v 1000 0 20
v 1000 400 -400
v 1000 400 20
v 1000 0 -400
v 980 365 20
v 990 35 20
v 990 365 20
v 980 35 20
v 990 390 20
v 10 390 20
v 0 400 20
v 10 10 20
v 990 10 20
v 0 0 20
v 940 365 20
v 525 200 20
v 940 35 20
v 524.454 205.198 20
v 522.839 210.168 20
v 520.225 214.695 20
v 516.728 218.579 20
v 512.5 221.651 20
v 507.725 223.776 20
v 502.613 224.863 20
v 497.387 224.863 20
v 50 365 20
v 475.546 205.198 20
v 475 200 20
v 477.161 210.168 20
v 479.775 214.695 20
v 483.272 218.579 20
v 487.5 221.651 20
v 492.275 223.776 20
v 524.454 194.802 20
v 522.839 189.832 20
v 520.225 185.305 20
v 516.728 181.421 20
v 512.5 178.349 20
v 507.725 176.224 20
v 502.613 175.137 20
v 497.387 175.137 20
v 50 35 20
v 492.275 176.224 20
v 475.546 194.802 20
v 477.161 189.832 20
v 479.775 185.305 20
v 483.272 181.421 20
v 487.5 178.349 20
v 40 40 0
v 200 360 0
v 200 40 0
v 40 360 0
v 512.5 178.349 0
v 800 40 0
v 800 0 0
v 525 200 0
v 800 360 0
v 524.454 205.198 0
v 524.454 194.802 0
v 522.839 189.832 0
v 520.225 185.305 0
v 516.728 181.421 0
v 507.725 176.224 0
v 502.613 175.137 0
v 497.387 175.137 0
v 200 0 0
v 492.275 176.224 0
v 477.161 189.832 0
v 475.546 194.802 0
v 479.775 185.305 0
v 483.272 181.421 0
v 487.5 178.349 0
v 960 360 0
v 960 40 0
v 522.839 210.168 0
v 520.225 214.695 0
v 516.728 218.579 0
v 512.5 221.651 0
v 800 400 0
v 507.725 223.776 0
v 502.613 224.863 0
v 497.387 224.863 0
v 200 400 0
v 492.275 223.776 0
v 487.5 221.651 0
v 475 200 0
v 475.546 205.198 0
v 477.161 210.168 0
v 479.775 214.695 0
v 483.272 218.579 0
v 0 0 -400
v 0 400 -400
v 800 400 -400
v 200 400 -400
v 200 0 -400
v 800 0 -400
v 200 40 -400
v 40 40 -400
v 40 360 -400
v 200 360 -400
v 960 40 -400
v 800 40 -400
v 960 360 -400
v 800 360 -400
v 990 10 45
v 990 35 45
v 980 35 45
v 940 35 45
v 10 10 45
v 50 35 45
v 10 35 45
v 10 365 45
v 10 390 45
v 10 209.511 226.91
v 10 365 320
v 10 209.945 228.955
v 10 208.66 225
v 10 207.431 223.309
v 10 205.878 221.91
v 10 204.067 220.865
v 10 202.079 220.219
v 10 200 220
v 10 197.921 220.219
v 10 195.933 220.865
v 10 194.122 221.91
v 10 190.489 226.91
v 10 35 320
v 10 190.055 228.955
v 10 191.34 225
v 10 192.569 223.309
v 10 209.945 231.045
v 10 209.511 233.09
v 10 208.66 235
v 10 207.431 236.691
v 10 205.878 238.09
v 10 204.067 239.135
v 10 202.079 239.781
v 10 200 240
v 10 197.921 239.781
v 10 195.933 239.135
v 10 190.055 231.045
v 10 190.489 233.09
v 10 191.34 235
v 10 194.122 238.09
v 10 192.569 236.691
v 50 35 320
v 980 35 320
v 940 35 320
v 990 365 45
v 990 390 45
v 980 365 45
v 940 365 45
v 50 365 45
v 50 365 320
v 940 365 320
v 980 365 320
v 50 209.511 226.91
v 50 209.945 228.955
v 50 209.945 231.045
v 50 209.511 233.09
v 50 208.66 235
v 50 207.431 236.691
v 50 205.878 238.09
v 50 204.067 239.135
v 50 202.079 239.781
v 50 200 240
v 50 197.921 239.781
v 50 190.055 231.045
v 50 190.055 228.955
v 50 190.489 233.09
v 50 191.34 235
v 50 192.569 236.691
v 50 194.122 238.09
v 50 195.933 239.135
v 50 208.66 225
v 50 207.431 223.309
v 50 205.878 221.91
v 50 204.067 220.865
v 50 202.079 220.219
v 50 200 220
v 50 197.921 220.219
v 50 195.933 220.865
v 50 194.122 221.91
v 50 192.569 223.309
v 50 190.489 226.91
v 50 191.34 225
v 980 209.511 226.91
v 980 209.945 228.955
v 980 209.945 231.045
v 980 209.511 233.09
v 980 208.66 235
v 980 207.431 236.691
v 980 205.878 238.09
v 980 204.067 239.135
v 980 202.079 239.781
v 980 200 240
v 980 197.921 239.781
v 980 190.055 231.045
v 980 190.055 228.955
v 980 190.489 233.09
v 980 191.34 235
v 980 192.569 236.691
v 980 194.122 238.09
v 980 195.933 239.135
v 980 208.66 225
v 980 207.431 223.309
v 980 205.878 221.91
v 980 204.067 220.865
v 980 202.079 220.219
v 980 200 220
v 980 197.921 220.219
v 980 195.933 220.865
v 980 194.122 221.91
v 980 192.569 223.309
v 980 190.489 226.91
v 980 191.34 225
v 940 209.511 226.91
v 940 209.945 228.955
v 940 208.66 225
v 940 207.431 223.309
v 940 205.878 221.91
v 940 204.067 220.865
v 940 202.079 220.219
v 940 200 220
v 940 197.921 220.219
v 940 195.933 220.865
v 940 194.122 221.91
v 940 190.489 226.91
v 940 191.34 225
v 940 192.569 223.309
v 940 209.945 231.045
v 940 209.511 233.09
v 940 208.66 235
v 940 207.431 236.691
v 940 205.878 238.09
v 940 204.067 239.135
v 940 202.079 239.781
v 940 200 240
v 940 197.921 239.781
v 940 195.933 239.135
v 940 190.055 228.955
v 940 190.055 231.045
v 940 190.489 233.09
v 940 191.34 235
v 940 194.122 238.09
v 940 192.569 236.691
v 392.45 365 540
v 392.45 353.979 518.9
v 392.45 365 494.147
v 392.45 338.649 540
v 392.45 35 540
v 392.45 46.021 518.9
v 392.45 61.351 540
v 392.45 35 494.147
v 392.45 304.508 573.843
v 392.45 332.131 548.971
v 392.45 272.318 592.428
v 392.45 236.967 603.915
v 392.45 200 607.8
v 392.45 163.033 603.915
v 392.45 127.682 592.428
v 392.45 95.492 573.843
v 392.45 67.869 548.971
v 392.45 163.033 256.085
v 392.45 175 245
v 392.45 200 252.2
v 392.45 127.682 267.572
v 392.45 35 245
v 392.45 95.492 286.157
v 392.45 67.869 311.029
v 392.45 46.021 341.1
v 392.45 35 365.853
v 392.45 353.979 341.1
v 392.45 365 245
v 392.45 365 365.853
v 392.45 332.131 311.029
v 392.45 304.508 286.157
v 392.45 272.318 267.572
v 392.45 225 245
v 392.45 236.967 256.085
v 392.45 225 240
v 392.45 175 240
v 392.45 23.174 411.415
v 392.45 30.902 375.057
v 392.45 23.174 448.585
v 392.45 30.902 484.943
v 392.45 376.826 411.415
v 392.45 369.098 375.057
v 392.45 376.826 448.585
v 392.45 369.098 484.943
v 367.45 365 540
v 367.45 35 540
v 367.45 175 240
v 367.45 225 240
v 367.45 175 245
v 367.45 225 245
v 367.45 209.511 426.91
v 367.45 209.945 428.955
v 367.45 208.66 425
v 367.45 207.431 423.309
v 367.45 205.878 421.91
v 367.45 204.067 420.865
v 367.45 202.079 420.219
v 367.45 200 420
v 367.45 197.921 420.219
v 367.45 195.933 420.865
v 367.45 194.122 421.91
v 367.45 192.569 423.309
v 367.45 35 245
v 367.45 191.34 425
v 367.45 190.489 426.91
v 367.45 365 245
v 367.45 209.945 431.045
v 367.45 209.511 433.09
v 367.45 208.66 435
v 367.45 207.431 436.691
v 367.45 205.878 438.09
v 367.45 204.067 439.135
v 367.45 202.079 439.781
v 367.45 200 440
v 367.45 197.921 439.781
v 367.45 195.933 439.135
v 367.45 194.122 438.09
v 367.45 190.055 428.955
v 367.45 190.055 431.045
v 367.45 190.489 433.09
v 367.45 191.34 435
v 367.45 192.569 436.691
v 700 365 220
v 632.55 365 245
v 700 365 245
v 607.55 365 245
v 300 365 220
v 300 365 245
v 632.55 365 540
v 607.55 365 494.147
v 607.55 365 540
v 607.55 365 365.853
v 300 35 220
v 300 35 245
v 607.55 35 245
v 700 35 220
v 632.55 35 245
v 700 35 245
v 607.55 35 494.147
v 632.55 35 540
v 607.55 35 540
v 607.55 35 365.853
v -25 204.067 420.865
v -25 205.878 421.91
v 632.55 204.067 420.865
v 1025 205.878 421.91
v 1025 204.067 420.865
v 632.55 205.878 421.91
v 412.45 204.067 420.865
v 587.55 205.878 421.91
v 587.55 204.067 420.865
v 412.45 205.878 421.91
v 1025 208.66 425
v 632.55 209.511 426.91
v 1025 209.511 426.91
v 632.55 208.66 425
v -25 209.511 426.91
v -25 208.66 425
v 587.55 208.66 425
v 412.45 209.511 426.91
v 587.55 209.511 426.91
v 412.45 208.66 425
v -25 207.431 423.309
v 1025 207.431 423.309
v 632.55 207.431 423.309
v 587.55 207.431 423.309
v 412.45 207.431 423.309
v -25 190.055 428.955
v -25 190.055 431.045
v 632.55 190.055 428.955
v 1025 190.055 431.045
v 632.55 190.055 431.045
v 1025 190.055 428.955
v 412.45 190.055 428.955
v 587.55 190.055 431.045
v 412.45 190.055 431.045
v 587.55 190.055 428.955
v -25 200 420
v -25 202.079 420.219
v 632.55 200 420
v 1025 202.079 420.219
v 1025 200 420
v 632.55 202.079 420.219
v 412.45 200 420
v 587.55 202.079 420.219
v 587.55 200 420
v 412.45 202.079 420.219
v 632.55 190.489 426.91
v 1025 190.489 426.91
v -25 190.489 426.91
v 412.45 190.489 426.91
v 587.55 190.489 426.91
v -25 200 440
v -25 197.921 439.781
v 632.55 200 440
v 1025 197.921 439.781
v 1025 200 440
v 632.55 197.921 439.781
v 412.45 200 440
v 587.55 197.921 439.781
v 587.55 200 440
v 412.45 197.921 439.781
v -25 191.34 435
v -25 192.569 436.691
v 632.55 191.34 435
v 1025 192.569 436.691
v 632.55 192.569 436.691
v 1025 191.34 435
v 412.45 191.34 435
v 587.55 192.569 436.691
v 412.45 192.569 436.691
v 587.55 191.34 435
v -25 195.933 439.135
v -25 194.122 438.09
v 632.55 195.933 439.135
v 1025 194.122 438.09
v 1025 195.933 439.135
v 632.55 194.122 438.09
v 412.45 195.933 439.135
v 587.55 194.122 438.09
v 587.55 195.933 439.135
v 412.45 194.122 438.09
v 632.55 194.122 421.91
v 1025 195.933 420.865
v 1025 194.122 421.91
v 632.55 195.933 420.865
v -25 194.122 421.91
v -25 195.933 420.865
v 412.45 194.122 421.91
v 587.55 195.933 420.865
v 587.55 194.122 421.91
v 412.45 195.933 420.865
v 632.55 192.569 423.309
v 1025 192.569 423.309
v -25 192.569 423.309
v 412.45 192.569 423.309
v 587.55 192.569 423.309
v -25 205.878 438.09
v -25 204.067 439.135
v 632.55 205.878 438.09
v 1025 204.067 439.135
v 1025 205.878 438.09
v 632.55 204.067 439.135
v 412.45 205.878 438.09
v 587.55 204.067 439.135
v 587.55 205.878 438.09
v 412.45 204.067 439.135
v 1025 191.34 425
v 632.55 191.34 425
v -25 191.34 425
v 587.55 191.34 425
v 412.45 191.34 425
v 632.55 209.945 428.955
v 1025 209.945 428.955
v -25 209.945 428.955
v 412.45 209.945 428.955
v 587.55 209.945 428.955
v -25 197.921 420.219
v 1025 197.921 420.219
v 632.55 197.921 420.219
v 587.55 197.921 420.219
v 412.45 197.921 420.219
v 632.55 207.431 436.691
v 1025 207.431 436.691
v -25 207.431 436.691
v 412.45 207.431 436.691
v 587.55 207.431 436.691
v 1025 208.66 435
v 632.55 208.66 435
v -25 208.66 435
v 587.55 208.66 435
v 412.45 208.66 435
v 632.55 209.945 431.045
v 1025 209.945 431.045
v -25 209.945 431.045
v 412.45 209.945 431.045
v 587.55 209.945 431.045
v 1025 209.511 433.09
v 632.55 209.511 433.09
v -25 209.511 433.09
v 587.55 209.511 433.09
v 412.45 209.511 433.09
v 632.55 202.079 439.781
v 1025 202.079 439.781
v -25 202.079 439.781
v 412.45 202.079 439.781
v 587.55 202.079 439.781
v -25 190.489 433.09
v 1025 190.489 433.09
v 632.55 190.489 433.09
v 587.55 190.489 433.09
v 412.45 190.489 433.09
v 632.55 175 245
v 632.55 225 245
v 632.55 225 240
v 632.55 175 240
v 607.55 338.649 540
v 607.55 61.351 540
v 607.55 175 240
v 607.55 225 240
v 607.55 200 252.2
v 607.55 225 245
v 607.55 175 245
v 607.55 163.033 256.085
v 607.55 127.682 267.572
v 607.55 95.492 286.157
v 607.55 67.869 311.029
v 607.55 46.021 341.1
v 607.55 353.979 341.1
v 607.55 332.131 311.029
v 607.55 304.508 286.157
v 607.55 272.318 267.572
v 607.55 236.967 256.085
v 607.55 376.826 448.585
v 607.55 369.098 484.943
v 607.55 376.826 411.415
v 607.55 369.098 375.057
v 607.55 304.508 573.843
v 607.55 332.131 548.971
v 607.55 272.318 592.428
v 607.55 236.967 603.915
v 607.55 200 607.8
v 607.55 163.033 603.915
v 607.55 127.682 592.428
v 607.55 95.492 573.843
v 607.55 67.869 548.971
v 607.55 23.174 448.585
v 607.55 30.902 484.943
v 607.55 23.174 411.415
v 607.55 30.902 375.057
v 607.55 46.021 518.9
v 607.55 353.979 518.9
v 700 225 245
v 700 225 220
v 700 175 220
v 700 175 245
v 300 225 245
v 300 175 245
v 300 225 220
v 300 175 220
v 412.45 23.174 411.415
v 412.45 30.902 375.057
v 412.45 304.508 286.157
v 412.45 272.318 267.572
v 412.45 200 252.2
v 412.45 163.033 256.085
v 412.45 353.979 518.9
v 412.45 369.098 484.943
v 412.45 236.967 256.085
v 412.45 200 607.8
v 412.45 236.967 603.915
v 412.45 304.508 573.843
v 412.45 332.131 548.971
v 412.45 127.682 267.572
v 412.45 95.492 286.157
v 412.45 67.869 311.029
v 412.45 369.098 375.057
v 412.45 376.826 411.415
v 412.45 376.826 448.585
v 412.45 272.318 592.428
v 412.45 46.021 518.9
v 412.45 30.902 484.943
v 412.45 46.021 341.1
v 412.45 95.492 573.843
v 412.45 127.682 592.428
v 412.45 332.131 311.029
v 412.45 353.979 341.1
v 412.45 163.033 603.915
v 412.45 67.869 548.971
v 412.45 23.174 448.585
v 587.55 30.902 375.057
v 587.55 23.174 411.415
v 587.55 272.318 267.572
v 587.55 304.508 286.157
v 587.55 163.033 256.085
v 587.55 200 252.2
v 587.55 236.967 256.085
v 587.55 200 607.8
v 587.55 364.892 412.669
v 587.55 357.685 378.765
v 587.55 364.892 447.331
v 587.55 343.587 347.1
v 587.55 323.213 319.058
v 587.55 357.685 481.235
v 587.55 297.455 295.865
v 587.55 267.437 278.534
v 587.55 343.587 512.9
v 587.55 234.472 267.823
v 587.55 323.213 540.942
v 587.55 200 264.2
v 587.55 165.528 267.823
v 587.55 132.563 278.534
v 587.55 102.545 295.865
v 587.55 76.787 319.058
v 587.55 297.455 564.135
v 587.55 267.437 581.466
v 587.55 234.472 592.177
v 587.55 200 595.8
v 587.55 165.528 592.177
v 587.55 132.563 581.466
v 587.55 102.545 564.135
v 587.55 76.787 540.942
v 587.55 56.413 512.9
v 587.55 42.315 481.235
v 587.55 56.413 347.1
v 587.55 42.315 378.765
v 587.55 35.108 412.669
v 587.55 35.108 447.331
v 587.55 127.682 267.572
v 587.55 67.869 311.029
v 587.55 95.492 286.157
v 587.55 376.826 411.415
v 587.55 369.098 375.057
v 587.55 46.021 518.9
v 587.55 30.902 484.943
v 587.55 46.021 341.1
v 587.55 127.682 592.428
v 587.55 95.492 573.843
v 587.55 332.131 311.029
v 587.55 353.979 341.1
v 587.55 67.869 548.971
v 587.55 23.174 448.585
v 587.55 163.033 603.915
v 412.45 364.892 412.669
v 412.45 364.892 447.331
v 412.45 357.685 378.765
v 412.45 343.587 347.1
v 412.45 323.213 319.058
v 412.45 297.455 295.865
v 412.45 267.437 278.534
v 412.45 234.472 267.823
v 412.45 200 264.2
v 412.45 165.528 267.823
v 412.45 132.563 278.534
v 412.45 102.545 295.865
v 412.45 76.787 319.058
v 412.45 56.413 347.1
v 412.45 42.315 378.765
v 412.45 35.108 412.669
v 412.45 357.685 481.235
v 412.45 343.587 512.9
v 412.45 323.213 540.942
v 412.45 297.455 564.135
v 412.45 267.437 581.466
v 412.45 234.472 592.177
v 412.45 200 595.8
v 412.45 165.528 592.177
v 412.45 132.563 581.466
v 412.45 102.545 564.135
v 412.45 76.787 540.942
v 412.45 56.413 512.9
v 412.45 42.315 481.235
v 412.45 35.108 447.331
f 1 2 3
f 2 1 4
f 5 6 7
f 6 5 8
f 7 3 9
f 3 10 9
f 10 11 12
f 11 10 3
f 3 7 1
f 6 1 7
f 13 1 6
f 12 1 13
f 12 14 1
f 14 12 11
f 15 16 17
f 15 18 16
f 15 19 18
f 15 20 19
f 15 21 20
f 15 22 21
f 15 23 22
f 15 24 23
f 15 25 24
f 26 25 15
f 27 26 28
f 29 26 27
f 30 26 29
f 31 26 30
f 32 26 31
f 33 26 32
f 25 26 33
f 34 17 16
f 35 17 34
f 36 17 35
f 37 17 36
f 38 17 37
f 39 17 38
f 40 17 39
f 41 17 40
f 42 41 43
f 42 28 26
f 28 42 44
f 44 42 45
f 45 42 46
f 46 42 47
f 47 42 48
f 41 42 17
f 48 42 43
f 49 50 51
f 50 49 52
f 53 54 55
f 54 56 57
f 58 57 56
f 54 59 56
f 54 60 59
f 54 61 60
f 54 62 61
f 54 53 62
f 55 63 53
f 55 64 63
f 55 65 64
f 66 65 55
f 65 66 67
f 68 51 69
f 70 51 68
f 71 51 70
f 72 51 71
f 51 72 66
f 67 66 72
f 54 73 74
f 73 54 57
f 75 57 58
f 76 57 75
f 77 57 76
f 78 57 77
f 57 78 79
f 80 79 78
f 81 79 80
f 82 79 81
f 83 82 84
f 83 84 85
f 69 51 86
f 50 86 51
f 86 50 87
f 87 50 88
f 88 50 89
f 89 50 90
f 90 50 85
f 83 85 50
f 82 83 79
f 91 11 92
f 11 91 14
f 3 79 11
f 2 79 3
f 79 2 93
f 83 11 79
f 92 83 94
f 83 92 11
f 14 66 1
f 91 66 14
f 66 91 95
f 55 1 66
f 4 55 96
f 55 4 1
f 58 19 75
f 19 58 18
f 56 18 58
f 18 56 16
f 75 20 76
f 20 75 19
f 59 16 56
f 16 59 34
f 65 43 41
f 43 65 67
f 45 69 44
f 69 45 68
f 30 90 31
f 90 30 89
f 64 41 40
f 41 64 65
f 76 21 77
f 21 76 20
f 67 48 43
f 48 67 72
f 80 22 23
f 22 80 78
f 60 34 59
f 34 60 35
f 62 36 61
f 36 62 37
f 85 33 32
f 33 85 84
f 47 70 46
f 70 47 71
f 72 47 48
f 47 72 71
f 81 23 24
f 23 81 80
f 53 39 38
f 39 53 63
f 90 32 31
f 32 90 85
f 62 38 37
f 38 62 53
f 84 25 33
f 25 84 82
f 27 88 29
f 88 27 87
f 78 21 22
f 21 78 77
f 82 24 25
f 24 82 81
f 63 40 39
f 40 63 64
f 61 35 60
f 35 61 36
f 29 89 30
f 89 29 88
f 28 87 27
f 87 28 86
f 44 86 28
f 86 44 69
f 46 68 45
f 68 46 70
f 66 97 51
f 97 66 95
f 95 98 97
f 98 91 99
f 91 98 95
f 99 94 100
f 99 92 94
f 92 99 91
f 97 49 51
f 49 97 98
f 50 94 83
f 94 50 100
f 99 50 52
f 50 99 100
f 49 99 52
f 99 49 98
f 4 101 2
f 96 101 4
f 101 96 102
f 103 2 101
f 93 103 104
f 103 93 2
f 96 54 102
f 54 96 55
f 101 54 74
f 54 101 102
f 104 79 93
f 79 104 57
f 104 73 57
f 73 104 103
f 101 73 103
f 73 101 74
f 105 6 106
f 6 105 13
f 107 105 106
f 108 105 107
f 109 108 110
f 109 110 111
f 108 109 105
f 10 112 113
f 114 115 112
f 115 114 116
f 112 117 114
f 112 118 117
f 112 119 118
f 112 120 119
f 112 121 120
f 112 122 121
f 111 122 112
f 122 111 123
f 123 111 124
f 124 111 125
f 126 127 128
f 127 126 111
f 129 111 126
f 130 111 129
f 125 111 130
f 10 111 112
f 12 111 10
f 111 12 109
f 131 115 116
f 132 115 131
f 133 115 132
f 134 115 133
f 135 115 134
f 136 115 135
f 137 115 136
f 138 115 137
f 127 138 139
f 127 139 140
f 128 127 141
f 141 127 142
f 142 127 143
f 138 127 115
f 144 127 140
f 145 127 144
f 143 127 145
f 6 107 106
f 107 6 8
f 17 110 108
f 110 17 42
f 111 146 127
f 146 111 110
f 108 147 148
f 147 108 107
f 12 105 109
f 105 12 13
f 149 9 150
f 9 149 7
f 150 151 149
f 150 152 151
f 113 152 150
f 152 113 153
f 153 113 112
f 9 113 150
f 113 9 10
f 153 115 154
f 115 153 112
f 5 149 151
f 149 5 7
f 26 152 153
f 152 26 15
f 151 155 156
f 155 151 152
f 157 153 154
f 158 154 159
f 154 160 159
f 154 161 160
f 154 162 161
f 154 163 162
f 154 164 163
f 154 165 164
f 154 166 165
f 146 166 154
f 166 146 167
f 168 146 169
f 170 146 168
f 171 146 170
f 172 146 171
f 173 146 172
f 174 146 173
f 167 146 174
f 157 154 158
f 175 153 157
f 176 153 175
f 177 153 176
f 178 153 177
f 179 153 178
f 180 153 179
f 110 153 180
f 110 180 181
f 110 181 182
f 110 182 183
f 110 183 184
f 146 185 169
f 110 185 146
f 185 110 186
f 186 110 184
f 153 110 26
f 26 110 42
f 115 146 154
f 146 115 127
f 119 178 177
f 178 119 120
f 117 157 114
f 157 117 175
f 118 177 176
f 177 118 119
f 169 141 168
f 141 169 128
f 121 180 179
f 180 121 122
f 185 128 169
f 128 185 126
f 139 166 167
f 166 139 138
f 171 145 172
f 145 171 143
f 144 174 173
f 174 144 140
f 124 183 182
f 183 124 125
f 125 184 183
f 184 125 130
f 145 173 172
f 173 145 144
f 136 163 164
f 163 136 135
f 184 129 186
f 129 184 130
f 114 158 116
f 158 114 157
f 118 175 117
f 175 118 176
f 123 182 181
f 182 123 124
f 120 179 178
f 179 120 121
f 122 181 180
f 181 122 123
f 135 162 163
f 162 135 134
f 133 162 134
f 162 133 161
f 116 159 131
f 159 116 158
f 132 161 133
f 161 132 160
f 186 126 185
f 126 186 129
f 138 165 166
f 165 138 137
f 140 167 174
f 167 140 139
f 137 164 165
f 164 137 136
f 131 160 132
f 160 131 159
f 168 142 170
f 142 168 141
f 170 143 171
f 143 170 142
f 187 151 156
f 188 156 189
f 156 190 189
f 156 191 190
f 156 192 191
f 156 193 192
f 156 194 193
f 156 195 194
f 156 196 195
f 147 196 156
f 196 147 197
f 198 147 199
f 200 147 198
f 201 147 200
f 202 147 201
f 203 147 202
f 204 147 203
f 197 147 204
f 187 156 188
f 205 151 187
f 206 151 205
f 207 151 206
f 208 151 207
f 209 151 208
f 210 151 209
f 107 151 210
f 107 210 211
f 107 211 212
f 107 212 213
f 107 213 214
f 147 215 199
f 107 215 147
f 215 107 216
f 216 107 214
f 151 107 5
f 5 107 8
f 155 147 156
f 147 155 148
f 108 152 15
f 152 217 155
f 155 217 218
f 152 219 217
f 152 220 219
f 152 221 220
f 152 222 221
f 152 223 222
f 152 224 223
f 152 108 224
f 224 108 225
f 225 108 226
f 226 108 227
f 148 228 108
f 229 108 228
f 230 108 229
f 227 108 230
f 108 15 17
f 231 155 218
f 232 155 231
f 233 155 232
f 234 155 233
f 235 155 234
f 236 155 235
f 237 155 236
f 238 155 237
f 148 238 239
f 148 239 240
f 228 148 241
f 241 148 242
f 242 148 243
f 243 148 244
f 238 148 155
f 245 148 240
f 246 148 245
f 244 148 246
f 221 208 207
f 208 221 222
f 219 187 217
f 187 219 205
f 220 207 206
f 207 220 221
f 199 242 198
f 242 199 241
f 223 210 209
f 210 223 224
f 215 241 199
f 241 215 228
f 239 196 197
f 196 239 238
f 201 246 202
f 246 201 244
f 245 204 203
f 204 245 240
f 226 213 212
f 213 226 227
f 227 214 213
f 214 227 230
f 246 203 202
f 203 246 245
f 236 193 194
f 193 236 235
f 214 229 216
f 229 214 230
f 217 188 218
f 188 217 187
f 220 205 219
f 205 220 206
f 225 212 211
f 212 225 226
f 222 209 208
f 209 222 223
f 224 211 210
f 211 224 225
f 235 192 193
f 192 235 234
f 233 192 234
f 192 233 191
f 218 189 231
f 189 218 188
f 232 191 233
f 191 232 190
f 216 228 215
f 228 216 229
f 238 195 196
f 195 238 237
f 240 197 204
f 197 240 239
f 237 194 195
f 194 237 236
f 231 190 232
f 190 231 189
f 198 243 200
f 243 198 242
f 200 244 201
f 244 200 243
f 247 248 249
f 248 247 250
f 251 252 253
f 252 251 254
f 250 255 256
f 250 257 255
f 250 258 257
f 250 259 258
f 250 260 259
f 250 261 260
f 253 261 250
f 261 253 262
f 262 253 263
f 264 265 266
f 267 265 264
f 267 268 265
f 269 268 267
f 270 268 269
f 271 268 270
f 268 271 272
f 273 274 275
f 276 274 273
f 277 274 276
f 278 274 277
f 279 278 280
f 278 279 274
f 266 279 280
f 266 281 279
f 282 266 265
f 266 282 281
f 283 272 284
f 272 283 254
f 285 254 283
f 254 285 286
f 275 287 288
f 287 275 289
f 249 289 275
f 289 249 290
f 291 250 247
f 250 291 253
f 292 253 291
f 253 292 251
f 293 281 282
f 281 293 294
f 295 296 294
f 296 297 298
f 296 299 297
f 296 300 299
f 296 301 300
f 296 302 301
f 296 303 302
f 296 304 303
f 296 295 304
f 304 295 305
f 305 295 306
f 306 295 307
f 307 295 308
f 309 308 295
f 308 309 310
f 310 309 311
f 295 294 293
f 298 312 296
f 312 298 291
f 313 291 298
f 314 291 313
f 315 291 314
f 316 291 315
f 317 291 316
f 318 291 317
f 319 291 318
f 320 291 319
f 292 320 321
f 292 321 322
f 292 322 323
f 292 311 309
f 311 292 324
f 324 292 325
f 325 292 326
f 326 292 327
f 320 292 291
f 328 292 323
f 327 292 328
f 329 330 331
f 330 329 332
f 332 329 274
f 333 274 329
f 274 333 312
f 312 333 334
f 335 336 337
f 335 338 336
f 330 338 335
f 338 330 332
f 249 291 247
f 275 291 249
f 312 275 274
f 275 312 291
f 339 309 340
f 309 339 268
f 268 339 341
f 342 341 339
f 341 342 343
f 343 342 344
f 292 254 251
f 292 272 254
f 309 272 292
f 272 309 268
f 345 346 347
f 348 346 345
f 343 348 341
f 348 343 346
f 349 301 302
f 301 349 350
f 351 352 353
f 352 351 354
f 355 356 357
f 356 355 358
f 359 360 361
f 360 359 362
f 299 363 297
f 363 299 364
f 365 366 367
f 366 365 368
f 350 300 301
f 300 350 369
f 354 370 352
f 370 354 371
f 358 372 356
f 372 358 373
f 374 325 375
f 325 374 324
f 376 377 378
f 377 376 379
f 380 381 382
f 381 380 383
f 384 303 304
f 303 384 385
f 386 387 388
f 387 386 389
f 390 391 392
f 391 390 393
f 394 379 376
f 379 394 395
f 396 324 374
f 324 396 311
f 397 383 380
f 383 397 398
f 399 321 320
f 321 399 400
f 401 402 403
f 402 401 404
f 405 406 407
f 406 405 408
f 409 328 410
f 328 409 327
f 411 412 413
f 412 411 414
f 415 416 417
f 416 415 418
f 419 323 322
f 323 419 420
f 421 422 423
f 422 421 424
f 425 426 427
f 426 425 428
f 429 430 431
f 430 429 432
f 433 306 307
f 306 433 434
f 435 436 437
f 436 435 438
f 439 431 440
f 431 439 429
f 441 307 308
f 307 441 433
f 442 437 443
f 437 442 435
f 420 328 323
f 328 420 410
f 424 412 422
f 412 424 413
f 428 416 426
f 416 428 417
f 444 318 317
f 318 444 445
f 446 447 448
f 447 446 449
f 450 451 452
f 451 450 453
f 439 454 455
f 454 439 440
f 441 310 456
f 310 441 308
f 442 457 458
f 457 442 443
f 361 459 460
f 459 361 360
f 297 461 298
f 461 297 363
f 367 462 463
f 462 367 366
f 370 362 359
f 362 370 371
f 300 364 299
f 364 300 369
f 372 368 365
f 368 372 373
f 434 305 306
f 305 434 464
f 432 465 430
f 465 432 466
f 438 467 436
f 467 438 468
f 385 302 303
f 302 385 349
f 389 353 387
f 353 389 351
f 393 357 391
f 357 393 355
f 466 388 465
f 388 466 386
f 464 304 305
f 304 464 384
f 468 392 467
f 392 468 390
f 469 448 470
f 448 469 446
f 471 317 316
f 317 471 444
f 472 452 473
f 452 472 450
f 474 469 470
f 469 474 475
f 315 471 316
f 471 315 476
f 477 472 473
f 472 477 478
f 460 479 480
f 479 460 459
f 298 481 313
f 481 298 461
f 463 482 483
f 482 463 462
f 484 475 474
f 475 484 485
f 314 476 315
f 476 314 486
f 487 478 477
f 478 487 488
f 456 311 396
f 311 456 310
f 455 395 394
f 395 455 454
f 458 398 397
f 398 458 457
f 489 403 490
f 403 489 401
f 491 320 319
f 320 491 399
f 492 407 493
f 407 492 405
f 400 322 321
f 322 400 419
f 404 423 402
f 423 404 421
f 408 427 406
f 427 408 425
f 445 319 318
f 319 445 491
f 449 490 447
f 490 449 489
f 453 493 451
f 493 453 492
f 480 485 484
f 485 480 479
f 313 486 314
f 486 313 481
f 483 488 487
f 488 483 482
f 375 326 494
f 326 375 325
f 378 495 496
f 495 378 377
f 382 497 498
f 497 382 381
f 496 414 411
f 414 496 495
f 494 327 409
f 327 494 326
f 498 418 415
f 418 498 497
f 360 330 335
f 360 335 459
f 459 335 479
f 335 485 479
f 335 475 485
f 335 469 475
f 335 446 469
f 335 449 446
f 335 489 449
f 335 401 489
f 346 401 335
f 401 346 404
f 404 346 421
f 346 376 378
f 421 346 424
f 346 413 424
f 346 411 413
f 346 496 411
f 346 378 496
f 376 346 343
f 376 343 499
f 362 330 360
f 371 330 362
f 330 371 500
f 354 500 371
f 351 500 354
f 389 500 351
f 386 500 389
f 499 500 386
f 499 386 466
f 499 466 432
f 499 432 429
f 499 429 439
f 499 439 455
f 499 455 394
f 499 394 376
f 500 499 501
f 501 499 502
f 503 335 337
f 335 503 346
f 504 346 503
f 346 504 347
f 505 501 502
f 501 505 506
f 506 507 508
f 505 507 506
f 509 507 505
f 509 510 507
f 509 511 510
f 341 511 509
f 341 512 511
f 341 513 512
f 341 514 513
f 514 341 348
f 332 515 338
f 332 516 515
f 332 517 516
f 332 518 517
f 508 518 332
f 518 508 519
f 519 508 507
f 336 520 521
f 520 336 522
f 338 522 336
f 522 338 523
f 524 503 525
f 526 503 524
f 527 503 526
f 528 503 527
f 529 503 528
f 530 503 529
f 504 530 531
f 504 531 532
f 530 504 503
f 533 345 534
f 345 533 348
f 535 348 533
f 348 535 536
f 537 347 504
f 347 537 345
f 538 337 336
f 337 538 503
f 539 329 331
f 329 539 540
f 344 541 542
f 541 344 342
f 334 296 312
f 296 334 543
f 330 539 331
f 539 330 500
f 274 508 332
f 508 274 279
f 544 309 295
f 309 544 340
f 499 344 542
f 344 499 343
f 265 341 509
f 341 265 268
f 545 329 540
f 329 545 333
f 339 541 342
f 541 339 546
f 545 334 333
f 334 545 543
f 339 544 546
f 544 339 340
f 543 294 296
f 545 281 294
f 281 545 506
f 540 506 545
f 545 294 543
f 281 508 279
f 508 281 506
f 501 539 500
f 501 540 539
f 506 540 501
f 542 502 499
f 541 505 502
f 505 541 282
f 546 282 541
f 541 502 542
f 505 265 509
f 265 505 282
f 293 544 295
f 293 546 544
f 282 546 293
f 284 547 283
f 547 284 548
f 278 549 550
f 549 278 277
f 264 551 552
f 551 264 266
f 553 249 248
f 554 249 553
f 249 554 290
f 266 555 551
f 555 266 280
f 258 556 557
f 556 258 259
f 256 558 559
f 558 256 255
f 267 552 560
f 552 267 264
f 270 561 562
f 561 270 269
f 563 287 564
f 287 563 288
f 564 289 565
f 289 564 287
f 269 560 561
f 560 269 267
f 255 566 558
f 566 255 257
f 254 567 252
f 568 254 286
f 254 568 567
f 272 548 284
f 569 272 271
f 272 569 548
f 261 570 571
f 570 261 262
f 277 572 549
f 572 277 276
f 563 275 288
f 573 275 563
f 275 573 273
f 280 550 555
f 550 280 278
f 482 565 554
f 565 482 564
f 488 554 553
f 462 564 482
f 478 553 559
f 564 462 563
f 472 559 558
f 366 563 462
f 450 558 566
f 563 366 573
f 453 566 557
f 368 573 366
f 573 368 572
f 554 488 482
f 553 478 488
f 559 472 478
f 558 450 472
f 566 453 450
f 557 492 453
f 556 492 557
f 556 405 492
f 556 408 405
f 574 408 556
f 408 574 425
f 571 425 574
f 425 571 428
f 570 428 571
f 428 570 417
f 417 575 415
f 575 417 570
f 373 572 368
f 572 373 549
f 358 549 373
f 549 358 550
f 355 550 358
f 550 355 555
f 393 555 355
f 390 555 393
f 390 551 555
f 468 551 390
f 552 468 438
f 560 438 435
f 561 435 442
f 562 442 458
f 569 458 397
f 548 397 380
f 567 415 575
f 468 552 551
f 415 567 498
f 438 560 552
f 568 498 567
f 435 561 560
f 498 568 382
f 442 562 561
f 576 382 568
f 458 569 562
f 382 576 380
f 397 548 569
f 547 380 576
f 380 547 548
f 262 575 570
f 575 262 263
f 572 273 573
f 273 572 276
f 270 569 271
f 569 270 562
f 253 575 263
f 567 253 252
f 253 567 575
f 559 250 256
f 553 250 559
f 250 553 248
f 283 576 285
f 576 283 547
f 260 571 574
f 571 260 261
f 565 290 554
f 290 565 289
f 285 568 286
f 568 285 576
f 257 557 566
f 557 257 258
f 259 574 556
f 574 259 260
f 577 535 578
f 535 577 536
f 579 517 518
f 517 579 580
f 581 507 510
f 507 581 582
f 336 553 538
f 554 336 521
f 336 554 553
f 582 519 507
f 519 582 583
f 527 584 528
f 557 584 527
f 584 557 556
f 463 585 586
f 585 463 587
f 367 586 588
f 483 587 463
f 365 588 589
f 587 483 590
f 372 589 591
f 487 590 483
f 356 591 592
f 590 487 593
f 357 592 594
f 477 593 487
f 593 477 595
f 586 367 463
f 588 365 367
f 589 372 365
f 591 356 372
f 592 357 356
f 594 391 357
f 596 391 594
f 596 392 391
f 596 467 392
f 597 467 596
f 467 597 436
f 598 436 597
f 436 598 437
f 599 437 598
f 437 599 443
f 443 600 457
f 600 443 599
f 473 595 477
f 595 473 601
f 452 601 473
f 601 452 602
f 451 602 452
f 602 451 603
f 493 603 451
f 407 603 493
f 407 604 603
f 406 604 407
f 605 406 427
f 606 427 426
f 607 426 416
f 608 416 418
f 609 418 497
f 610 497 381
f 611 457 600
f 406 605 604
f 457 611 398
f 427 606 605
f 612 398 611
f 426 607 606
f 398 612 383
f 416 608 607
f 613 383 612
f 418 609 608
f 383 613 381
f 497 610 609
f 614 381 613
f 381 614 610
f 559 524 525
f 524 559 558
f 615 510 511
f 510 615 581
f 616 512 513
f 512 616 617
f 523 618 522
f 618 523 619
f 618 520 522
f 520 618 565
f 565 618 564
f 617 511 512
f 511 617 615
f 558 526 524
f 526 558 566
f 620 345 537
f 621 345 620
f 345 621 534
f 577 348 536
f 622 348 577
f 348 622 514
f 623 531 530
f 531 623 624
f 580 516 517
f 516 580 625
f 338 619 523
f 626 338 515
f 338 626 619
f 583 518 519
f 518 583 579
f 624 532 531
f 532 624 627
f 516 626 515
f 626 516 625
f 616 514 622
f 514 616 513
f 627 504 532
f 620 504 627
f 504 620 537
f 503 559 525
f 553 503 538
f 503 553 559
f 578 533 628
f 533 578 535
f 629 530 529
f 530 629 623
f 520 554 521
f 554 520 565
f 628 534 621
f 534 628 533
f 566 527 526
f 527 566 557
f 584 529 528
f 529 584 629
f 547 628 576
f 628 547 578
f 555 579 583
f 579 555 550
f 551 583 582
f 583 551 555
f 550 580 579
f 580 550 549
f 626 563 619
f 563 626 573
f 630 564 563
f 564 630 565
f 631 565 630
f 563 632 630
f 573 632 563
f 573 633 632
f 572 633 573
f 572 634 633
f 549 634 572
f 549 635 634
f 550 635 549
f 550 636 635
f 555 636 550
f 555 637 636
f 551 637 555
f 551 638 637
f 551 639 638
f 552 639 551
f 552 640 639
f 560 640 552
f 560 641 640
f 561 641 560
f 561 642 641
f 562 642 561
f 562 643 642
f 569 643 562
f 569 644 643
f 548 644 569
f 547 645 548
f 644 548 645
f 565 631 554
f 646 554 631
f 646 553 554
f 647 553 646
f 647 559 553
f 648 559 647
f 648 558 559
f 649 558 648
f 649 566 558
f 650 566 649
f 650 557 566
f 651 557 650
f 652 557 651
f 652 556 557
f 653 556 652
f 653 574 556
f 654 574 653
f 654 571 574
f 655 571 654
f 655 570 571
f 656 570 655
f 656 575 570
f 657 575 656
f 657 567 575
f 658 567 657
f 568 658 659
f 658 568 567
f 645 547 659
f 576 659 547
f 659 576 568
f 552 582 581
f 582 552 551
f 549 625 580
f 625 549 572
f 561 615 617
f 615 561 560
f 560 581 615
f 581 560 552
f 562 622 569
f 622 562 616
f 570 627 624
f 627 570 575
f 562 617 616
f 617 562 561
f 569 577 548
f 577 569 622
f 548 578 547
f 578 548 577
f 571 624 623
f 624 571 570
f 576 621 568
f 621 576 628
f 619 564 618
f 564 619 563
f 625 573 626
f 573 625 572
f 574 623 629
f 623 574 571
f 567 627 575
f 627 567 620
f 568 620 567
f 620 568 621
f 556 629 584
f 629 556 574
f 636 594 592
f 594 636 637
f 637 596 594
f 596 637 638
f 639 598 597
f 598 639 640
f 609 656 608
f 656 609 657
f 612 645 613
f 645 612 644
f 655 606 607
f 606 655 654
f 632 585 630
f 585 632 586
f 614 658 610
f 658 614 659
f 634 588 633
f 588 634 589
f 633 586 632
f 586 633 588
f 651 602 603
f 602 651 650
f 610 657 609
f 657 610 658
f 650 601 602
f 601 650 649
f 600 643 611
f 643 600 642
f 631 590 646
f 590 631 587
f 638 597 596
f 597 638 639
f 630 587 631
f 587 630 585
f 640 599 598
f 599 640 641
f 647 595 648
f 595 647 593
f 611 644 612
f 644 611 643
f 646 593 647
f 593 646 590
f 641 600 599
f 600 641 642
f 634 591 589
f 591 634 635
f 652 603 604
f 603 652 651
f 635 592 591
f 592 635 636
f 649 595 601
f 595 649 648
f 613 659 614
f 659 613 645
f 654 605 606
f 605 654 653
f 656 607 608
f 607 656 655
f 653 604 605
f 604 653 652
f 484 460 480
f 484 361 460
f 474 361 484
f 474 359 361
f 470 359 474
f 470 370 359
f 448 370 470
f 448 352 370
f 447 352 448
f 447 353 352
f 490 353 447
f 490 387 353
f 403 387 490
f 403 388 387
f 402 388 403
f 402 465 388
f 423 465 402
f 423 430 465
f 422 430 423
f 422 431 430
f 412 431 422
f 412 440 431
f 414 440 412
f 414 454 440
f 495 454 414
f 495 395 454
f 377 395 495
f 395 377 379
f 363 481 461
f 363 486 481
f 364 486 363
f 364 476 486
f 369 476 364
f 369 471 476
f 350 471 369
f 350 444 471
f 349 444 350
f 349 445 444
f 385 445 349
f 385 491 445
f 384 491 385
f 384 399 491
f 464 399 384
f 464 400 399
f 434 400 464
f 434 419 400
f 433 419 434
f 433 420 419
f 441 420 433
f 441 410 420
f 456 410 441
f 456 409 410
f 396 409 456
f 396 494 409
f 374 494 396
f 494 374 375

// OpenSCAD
/**
 * 3D CAD model of a jig for milling the outside of drum shells.
 * Inspired by Murray Drums (https://www.youtube.com/watch?v=dOMvS0FD7M8),
 * with added features.
 * -
 * Copyright (c) 2015 Jannis Pohlmann <jannis@xfce.org>
 *
 * This program is free software: you can redistribute it and/or modify
 * it under the terms of the GNU General Public License as published by
 * the Free Software Foundation, either version 3 of the License, or
 * (at your option) any later version.
 *
 * This program is distributed in the hope that it will be useful,
 * but WITHOUT ANY WARRANTY; without even the implied warranty of
 * MERCHANTABILITY or FITNESS FOR A PARTICULAR PURPOSE.  See the
 * GNU General Public License for more details.
 *
 * You should have received a copy of the GNU General Public License
 * along with this program.  If not, see <http://www.gnu.org/licenses/>.
 */

/**
 * The jig consists of a base board/table to which a router is mounted from
 * below and a mount for drum shells of different sizes, based on a threaded
 * rod. Its purpose is to make a drum shell round and flush from the outside.
 * It is to be used before the shell is round from the inside.
 *
 * Two round, ideally-sized wooden template plates are attached to the
 * shell from both sides. Four large screws stick out of each plate according
 * to the inner diameter of the shell and are used to anchor the shell and
 * hold it in place without having to drill holes into it.
 *
 * The two round plates have two holes exactly in the middle, into which
 * hex nuts are inserted such that they don't turn. The round plates are
 * then placed inbetween two panels (each again with a hole drilled in the
 * center) that are slightly bigger and therefor hold the drum shell up in
 * the air. These outer panels have a fixed distance to prevent the shell
 * from moving around towards the sides.
 *
 * The above shell mount is then put onto a threaded rod such that the hex
 * nuts in the shell templates allow to move the shell along the rod as it
 * is spun around the rod axis.
 *
 * This is then placed on the base board, which has guides on the sides,
 * preventing the shell mount from moving anywhere but along the rod. By
 * attaching a router to the bottom of the base board, with the router bit
 * sticking out far enough to trim the shell down to the desired outer
 * diameter, the shell can now be made round by spinning it from one side
 * of the rod/base board to the other and back (as often as desired).
 */

module base()
{
  // Base board with a center hole for the router

  difference() {
    color([0, 0, 0])
    cube([1000, 400, 20]);

    translate([500, 200, 10])
    cylinder(35, 25, 25, true);
  }

  // Table legs at the bottom of the board

  translate([0, 0, -400])
  color([1.0, 1.0, 1.0])
  cube([200, 40, 400]);

  translate([0, 360, -400])
  color([1.0, 1.0, 1.0])
  cube([200, 40, 400]);

  translate([40, 40, -400])
  rotate(90)
  color([1.0, 1.0, 1.0])
  cube([320, 40, 400]);

  translate([800, 0, -400])
  color([1.0, 1.0, 1.0])
  cube([200, 40, 400]);

  translate([800, 360, -400])
  color([1.0, 1.0, 1.0])
  cube([200, 40, 400]);

  translate([1000, 40, -400])
  rotate(90)
  color([1.0, 1.0, 1.0])
  cube([320, 40, 400]);

  // Guides for shell mount

  translate([10, 10, 20])
  color([1, 1, 1])
  cube([980, 25, 25]);

  translate([10, 365, 20])
  color([1, 1, 1])
  cube([980, 25, 25]);
}

module rod_mount()
{
  // Outer mounts for the threaded rod

  difference() {
    translate([10, 35, 20])
    color([0.8, 0.6, 0.5])
    cube([40, 330, 300]);

    translate([0, 200, 230])
    rotate([0, 90, 0])
    cylinder(60, 10, 10);
  }

  difference() {
    translate([940, 35, 20])
    color([0.8, 0.6, 0.5])
    cube([40, 330, 300]);

    translate([930, 200, 230])
    rotate([0, 90, 0])
    cylinder(60, 10, 10);
  }
}

module rod()
{
  translate([-25, 200, 230])
  rotate([0, 90, 0])
  color([0.5, 0.5, 0.5])
  cylinder(1050, 10, 10);
}

module shell()
{
  // Example drum shell (14"x6.5")

  d = 14 * 2.54 * 10;
  h = 6.5 * 2.54 * 10 + 10;

  translate([500, 200, 230])
  rotate([0, 90, 0])
  difference() {
    cylinder(h, d / 2, d / 2, true);
    cylinder(h + 20, d / 2 - 12, d / 2 - 12, true);
  }
}

module shell_mount()
{
  // Runners for the shell

  difference() {
    translate([367.45, 35, 40])
    color([0.8, 0.6, 0.5])
    cube([25, 330, 300]);

    translate([357.45, 200, 230])
    rotate([0, 90, 0])
    cylinder(45, 10, 10);
  }

  difference() {
    translate([607.55, 35, 40])
    color([0.8, 0.6, 0.5])
    cube([25, 330, 300]);

    translate([597.55, 200, 230])
    rotate([0, 90, 0])
    cylinder(45, 10, 10);
  }

  // Plate to hold the runners at the right and same distance

  translate([500-400/2, 35, 20])
  difference() {
    color([0.8, 0.6, 0.5])
    cube([400, 330, 25]);

    translate([-10, 330/2 - 50/2, -10])
    cube([420, 50, 45]);
  };

  d = 14 * 2.54 * 10;

  // Round plates to mount the drum shell
  // Example drum shell (14"x6.5")
  translate([402.45, 200, 230])
  rotate([0, 90, 0])
  color([1, 1, 1])
  cylinder(20, d / 2, d / 2, true);

  translate([597.55, 200, 230])
  rotate([0, 90, 0])
  color([1, 1, 1])
  cylinder(20, d / 2, d / 2, true);
}

union() {
  base();
  rod_mount();
}

translate([0, 0, 200])
union() {
  shell_mount();
  rod();
  shell();
}
